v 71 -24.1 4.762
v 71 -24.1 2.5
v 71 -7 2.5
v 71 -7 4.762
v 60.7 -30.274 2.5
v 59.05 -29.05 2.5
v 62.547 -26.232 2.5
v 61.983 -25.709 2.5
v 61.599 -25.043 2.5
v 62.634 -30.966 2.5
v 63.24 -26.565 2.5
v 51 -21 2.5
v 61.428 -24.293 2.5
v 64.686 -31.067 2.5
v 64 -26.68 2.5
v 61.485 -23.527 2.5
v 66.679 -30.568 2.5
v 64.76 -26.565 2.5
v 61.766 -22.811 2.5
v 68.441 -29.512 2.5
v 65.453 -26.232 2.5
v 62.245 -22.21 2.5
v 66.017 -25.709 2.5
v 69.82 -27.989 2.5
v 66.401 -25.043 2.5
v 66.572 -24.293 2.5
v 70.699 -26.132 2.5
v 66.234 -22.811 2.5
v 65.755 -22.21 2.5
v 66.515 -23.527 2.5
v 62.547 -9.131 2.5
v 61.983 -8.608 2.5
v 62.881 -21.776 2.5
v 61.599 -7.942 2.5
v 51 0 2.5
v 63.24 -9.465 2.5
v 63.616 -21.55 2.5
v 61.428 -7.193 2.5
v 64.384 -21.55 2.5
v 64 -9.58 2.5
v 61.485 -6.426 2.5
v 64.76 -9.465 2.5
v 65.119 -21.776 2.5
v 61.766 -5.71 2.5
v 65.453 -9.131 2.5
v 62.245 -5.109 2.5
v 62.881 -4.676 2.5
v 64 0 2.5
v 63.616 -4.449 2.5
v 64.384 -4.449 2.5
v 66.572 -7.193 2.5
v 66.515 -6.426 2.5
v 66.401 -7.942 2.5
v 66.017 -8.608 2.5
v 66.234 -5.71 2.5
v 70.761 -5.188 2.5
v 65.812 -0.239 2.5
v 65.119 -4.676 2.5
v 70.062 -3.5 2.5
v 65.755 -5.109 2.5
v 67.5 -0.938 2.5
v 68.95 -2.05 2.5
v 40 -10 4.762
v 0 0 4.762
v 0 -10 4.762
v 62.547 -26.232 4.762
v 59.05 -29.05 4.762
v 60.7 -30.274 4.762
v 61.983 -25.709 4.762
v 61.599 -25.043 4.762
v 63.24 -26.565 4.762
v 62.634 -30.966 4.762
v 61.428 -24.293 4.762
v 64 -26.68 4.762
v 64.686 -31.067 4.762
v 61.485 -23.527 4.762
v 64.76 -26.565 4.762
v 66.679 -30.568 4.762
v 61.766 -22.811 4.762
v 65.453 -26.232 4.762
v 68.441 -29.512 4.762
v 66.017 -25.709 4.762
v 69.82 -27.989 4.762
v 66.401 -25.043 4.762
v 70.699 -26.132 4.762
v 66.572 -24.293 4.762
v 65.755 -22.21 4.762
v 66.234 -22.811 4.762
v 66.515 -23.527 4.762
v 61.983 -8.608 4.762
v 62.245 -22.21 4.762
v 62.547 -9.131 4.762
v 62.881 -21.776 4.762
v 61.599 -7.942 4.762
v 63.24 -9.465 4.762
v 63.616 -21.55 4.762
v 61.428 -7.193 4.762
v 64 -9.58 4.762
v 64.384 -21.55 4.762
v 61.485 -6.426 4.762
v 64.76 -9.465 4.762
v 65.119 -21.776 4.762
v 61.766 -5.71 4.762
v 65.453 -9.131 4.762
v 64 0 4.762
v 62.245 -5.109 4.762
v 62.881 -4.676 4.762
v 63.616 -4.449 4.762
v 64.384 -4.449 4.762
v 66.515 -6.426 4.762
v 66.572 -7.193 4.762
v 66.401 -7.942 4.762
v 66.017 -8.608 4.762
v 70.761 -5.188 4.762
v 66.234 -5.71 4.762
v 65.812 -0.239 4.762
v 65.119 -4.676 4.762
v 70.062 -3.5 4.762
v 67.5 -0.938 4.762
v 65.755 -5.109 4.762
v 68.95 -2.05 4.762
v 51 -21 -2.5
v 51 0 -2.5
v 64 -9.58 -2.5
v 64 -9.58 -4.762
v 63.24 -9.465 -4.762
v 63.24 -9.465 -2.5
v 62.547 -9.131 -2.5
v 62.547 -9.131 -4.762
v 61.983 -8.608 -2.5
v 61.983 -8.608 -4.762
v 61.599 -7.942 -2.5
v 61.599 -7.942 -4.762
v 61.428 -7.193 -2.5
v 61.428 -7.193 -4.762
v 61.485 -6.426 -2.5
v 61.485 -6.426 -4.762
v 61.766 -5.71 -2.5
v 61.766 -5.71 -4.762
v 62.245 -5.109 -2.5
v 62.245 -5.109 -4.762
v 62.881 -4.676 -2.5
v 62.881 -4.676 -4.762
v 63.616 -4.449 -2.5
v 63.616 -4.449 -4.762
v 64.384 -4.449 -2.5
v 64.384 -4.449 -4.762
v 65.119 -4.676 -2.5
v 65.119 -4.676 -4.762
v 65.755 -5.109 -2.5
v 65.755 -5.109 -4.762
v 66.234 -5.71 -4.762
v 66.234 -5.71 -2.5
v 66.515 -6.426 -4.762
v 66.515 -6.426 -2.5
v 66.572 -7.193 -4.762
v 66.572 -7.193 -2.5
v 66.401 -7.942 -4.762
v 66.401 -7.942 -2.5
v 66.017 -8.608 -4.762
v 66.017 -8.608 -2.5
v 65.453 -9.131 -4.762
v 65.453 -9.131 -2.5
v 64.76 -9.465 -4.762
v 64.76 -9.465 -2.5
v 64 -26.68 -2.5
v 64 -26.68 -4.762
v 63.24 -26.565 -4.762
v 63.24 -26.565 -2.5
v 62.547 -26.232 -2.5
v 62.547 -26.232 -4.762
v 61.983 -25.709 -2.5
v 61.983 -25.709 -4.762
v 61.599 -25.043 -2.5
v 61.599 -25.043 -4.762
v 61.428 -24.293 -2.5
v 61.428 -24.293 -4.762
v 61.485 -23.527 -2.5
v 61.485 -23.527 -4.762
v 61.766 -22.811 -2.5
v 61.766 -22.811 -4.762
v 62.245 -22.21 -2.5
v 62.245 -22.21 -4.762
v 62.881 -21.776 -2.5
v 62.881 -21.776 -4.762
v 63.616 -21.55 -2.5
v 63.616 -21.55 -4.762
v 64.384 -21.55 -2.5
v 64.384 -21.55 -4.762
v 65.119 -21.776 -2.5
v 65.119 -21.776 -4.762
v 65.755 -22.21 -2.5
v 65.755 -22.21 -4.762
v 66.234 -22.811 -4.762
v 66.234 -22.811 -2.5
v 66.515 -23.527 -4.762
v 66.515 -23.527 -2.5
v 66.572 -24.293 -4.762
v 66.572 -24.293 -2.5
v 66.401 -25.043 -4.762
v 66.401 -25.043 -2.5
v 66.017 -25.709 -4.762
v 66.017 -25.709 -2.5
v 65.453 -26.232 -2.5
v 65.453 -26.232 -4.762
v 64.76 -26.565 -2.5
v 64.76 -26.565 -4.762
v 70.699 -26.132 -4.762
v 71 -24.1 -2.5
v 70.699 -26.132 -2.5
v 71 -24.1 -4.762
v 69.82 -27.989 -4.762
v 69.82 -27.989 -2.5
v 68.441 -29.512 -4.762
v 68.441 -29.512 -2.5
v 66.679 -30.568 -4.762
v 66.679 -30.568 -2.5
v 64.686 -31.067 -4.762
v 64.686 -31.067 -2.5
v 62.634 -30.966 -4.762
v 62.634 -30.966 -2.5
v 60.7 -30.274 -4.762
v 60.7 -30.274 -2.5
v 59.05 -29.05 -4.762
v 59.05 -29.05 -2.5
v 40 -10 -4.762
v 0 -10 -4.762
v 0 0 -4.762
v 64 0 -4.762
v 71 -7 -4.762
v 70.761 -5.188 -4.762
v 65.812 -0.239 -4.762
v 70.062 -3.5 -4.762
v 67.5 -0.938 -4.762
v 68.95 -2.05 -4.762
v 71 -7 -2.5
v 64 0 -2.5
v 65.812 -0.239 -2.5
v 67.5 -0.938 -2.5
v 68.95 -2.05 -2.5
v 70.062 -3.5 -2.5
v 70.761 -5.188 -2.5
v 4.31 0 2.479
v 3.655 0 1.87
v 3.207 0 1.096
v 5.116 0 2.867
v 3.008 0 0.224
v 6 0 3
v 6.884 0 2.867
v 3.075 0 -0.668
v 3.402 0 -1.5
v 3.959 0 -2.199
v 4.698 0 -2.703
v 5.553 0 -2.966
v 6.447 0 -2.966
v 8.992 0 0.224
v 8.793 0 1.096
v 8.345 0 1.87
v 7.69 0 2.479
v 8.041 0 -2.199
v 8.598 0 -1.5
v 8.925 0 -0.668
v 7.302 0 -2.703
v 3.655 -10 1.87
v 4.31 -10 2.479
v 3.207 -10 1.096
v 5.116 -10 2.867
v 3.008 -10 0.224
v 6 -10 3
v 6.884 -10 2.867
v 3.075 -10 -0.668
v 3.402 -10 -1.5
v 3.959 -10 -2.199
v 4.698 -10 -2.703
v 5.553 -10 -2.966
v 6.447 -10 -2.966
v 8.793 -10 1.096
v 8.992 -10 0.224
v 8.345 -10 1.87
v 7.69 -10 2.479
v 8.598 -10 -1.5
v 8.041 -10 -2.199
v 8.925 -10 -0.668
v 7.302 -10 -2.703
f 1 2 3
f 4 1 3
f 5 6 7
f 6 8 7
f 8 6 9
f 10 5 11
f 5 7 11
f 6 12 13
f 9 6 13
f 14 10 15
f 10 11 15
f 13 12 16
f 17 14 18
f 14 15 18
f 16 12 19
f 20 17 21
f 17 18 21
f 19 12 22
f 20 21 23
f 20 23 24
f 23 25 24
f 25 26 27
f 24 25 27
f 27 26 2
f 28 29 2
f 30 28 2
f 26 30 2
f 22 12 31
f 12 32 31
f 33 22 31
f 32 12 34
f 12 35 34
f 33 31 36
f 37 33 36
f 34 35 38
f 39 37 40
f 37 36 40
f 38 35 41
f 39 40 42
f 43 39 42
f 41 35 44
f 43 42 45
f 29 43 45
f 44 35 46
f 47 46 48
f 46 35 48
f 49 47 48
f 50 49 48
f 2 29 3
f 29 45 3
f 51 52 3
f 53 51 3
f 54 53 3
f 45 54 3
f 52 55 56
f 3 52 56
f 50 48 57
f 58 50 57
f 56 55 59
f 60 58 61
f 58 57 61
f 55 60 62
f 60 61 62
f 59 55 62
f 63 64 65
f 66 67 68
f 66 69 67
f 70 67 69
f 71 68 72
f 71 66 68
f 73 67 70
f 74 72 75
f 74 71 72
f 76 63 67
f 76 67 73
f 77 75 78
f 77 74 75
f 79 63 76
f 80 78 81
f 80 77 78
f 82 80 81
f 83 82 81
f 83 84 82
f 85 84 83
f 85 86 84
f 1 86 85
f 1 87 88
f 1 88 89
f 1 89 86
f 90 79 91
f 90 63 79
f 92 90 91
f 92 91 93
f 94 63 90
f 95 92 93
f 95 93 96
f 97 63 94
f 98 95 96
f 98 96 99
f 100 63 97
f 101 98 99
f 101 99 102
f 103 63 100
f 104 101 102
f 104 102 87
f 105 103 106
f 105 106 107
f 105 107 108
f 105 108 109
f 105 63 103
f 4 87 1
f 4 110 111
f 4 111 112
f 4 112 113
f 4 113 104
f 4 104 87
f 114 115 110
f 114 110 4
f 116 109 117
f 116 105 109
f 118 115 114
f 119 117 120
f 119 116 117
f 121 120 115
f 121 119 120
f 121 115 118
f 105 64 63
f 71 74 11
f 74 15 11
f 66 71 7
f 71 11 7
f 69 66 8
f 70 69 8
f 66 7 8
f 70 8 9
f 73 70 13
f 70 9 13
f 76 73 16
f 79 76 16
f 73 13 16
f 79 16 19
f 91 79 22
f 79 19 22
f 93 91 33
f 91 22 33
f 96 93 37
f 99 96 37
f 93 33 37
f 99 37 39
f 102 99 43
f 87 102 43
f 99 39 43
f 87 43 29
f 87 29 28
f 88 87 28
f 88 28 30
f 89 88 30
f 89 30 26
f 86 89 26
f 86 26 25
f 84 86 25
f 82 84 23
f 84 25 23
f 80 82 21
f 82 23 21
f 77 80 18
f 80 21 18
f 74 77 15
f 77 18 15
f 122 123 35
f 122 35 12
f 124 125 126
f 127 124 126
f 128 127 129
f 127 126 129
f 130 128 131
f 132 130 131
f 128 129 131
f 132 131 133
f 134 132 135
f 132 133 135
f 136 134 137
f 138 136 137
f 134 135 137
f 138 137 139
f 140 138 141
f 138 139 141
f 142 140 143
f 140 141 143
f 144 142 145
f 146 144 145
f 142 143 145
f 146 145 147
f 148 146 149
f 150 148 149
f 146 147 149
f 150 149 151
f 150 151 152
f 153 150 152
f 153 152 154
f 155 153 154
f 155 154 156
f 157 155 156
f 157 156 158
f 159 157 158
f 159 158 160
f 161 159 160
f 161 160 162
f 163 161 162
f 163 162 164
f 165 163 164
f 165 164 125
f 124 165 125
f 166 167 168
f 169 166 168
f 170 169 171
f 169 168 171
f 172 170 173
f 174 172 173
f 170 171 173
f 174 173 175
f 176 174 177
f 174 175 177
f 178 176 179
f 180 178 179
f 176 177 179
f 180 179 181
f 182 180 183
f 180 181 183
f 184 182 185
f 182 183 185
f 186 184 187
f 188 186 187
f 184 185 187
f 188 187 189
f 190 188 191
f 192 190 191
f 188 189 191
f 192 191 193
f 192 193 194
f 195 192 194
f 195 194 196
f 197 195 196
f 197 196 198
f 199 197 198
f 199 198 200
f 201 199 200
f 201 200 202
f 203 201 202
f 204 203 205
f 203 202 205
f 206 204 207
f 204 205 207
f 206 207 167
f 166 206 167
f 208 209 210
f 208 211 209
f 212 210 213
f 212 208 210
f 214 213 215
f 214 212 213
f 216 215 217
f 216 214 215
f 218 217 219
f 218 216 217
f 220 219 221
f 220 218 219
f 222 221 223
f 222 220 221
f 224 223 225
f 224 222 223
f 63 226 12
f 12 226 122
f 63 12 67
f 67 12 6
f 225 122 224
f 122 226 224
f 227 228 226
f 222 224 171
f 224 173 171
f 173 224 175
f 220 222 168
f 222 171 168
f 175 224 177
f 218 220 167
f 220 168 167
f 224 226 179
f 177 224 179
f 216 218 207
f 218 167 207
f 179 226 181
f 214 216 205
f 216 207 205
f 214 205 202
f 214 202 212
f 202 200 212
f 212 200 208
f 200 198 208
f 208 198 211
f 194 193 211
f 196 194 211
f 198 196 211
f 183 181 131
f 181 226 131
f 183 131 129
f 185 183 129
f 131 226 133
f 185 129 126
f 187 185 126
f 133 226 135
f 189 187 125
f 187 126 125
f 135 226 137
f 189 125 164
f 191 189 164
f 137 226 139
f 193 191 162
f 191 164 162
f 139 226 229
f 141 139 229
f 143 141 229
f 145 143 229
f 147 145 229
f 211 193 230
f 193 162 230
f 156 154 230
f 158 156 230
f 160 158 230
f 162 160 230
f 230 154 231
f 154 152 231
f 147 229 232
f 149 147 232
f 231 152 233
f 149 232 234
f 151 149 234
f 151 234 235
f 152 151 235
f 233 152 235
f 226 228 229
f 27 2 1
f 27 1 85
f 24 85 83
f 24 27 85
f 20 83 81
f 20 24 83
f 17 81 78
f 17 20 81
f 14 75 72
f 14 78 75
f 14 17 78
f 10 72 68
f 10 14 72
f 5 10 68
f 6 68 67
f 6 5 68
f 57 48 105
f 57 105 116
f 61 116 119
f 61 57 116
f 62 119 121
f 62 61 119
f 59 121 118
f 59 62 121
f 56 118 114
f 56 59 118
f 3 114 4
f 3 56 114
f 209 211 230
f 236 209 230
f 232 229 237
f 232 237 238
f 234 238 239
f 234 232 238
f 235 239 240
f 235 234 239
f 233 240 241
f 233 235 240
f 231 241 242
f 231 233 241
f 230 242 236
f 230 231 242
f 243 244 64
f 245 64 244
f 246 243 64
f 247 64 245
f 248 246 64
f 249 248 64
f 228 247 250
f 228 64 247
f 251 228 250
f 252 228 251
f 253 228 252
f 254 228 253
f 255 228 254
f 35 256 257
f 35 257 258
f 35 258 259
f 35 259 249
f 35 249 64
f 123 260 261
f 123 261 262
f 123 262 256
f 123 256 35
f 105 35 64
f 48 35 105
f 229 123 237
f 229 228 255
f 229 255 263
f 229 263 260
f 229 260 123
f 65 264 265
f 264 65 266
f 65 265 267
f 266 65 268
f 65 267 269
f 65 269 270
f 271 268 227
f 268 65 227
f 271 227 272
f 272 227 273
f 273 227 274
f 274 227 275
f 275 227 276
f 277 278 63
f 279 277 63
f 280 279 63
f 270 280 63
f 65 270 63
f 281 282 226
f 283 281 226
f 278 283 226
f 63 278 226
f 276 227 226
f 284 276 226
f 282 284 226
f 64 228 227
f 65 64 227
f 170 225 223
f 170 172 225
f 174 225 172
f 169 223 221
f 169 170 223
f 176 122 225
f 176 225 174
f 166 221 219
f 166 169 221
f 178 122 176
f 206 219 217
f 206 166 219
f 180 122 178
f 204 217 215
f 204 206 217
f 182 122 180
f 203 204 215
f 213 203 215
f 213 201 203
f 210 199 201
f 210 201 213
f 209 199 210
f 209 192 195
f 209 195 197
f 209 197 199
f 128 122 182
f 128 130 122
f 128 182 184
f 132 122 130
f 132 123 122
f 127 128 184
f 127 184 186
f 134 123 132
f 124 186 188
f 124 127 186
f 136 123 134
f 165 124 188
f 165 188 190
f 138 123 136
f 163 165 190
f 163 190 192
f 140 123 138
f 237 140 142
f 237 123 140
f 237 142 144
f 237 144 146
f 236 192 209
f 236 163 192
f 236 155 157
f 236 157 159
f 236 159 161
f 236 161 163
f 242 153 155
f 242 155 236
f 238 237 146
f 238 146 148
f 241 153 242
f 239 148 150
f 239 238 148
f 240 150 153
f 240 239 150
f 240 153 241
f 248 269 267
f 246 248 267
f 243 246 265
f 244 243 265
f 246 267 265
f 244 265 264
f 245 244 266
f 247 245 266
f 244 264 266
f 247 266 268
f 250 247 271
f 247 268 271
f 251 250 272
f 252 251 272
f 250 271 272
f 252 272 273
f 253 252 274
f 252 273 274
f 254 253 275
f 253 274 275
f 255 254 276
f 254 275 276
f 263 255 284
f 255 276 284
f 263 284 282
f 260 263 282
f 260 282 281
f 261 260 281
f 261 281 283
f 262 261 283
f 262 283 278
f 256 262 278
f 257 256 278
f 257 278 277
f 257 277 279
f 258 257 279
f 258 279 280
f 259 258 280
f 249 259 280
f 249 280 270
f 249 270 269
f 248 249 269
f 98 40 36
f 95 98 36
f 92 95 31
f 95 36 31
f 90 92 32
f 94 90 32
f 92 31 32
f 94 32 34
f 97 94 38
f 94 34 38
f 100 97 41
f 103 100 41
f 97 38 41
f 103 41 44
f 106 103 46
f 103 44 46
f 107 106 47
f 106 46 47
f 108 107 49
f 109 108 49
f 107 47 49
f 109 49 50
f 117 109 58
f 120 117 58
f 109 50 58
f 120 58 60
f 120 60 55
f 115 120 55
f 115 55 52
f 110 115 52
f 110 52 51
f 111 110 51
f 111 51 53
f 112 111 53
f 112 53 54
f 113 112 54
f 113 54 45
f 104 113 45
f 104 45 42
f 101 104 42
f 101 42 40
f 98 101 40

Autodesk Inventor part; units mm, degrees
ref_plane "YZ Plane" through (0, 0, 0) normal (1, 0, 0) x (0, 1, 0)
ref_plane "XZ Plane" through (0, 0, 0) normal (0, 1, 0) x (-1, 0, 0)
ref_plane "XY Plane" through (0, 0, 0) normal (0, 0, 1) x (1, 0, 0)
sketch "Sketch1" plane through (0, 0, 0) normal (0, 0, 1) x (1, 0, 0)
  line L0 (0, 0) -> (64, 0)
  arc A0 (71, -7) -> (64, 0) centre (64, -7) ccw
  line L1 (64, 0) -> (64, -7) construction
  line L2 (71, -7) -> (64, -7) construction
  line L3 (0, 0) -> (0, -10)
  line L4 (0, -10) -> (40, -10)
  line L5 (40, -10) -> (59.0503, -29.0503)
  line L6 (71, -24.1005) -> (71, -7)
  arc A1 (59.0503, -29.0503) -> (71, -24.1005) centre (64, -24.1005) ccw
  line L7 (51, 0) -> (51, -21)
  dimension "d0" = 64
  dimension "d1" = 7
  dimension "d2" = 90
  dimension "d3" = 10
  dimension "d4" = 40
  dimension "d5" = 90
  dimension "d6" = 135
  dimension "d7" = 7
  dimension "d8" = 20
extrude "Extrusion1" add sketch "Sketch1" along normal mid plane 9.525
extrude "Extrusion2" cut sketch "Sketch1" along normal mid plane 5 contours L0 A0 L6 A1 L5 L7
hole "Hole1" at (64, -7, 0) at (64, -24.1005, 0) direction (0, 0, -1) diameter 5.159 end through all both
sketch "Sketch2" plane through (0, 0, -4.7625) normal (0, 1, 0) x (1, 0, 0)
  line L0 (64, -7.2625) -> (51, -7.2625) projected
  line L1 (51, -7.2625) -> (51, -2.2625) projected
  line L2 (51, -2.2625) -> (64, -2.2625) projected
  line L3 (64, -2.2625) -> (64, 0) projected
  line L4 (0, 0) -> (64, 0) projected
  line L5 (0, -9.525) -> (0, 0) projected
  line L6 (64, -9.525) -> (0, -9.525) projected
  line L7 (64, -9.525) -> (64, -7.2625) projected
  point P0 (0, -4.7625)
  point P1 (6, -4.7625)
  point P2 (0, -4.7625)
  dimension "d20" = 6
hole "Hole2" at (6, 0, 0) direction (0, -1, 0) diameter 6 end through all
thread "Thread1" size "M6x1" class "6H" standard "ANSI Metric M Profile" full length
equation "\"d7\" = d1"
properties part number "newfrontpart"
